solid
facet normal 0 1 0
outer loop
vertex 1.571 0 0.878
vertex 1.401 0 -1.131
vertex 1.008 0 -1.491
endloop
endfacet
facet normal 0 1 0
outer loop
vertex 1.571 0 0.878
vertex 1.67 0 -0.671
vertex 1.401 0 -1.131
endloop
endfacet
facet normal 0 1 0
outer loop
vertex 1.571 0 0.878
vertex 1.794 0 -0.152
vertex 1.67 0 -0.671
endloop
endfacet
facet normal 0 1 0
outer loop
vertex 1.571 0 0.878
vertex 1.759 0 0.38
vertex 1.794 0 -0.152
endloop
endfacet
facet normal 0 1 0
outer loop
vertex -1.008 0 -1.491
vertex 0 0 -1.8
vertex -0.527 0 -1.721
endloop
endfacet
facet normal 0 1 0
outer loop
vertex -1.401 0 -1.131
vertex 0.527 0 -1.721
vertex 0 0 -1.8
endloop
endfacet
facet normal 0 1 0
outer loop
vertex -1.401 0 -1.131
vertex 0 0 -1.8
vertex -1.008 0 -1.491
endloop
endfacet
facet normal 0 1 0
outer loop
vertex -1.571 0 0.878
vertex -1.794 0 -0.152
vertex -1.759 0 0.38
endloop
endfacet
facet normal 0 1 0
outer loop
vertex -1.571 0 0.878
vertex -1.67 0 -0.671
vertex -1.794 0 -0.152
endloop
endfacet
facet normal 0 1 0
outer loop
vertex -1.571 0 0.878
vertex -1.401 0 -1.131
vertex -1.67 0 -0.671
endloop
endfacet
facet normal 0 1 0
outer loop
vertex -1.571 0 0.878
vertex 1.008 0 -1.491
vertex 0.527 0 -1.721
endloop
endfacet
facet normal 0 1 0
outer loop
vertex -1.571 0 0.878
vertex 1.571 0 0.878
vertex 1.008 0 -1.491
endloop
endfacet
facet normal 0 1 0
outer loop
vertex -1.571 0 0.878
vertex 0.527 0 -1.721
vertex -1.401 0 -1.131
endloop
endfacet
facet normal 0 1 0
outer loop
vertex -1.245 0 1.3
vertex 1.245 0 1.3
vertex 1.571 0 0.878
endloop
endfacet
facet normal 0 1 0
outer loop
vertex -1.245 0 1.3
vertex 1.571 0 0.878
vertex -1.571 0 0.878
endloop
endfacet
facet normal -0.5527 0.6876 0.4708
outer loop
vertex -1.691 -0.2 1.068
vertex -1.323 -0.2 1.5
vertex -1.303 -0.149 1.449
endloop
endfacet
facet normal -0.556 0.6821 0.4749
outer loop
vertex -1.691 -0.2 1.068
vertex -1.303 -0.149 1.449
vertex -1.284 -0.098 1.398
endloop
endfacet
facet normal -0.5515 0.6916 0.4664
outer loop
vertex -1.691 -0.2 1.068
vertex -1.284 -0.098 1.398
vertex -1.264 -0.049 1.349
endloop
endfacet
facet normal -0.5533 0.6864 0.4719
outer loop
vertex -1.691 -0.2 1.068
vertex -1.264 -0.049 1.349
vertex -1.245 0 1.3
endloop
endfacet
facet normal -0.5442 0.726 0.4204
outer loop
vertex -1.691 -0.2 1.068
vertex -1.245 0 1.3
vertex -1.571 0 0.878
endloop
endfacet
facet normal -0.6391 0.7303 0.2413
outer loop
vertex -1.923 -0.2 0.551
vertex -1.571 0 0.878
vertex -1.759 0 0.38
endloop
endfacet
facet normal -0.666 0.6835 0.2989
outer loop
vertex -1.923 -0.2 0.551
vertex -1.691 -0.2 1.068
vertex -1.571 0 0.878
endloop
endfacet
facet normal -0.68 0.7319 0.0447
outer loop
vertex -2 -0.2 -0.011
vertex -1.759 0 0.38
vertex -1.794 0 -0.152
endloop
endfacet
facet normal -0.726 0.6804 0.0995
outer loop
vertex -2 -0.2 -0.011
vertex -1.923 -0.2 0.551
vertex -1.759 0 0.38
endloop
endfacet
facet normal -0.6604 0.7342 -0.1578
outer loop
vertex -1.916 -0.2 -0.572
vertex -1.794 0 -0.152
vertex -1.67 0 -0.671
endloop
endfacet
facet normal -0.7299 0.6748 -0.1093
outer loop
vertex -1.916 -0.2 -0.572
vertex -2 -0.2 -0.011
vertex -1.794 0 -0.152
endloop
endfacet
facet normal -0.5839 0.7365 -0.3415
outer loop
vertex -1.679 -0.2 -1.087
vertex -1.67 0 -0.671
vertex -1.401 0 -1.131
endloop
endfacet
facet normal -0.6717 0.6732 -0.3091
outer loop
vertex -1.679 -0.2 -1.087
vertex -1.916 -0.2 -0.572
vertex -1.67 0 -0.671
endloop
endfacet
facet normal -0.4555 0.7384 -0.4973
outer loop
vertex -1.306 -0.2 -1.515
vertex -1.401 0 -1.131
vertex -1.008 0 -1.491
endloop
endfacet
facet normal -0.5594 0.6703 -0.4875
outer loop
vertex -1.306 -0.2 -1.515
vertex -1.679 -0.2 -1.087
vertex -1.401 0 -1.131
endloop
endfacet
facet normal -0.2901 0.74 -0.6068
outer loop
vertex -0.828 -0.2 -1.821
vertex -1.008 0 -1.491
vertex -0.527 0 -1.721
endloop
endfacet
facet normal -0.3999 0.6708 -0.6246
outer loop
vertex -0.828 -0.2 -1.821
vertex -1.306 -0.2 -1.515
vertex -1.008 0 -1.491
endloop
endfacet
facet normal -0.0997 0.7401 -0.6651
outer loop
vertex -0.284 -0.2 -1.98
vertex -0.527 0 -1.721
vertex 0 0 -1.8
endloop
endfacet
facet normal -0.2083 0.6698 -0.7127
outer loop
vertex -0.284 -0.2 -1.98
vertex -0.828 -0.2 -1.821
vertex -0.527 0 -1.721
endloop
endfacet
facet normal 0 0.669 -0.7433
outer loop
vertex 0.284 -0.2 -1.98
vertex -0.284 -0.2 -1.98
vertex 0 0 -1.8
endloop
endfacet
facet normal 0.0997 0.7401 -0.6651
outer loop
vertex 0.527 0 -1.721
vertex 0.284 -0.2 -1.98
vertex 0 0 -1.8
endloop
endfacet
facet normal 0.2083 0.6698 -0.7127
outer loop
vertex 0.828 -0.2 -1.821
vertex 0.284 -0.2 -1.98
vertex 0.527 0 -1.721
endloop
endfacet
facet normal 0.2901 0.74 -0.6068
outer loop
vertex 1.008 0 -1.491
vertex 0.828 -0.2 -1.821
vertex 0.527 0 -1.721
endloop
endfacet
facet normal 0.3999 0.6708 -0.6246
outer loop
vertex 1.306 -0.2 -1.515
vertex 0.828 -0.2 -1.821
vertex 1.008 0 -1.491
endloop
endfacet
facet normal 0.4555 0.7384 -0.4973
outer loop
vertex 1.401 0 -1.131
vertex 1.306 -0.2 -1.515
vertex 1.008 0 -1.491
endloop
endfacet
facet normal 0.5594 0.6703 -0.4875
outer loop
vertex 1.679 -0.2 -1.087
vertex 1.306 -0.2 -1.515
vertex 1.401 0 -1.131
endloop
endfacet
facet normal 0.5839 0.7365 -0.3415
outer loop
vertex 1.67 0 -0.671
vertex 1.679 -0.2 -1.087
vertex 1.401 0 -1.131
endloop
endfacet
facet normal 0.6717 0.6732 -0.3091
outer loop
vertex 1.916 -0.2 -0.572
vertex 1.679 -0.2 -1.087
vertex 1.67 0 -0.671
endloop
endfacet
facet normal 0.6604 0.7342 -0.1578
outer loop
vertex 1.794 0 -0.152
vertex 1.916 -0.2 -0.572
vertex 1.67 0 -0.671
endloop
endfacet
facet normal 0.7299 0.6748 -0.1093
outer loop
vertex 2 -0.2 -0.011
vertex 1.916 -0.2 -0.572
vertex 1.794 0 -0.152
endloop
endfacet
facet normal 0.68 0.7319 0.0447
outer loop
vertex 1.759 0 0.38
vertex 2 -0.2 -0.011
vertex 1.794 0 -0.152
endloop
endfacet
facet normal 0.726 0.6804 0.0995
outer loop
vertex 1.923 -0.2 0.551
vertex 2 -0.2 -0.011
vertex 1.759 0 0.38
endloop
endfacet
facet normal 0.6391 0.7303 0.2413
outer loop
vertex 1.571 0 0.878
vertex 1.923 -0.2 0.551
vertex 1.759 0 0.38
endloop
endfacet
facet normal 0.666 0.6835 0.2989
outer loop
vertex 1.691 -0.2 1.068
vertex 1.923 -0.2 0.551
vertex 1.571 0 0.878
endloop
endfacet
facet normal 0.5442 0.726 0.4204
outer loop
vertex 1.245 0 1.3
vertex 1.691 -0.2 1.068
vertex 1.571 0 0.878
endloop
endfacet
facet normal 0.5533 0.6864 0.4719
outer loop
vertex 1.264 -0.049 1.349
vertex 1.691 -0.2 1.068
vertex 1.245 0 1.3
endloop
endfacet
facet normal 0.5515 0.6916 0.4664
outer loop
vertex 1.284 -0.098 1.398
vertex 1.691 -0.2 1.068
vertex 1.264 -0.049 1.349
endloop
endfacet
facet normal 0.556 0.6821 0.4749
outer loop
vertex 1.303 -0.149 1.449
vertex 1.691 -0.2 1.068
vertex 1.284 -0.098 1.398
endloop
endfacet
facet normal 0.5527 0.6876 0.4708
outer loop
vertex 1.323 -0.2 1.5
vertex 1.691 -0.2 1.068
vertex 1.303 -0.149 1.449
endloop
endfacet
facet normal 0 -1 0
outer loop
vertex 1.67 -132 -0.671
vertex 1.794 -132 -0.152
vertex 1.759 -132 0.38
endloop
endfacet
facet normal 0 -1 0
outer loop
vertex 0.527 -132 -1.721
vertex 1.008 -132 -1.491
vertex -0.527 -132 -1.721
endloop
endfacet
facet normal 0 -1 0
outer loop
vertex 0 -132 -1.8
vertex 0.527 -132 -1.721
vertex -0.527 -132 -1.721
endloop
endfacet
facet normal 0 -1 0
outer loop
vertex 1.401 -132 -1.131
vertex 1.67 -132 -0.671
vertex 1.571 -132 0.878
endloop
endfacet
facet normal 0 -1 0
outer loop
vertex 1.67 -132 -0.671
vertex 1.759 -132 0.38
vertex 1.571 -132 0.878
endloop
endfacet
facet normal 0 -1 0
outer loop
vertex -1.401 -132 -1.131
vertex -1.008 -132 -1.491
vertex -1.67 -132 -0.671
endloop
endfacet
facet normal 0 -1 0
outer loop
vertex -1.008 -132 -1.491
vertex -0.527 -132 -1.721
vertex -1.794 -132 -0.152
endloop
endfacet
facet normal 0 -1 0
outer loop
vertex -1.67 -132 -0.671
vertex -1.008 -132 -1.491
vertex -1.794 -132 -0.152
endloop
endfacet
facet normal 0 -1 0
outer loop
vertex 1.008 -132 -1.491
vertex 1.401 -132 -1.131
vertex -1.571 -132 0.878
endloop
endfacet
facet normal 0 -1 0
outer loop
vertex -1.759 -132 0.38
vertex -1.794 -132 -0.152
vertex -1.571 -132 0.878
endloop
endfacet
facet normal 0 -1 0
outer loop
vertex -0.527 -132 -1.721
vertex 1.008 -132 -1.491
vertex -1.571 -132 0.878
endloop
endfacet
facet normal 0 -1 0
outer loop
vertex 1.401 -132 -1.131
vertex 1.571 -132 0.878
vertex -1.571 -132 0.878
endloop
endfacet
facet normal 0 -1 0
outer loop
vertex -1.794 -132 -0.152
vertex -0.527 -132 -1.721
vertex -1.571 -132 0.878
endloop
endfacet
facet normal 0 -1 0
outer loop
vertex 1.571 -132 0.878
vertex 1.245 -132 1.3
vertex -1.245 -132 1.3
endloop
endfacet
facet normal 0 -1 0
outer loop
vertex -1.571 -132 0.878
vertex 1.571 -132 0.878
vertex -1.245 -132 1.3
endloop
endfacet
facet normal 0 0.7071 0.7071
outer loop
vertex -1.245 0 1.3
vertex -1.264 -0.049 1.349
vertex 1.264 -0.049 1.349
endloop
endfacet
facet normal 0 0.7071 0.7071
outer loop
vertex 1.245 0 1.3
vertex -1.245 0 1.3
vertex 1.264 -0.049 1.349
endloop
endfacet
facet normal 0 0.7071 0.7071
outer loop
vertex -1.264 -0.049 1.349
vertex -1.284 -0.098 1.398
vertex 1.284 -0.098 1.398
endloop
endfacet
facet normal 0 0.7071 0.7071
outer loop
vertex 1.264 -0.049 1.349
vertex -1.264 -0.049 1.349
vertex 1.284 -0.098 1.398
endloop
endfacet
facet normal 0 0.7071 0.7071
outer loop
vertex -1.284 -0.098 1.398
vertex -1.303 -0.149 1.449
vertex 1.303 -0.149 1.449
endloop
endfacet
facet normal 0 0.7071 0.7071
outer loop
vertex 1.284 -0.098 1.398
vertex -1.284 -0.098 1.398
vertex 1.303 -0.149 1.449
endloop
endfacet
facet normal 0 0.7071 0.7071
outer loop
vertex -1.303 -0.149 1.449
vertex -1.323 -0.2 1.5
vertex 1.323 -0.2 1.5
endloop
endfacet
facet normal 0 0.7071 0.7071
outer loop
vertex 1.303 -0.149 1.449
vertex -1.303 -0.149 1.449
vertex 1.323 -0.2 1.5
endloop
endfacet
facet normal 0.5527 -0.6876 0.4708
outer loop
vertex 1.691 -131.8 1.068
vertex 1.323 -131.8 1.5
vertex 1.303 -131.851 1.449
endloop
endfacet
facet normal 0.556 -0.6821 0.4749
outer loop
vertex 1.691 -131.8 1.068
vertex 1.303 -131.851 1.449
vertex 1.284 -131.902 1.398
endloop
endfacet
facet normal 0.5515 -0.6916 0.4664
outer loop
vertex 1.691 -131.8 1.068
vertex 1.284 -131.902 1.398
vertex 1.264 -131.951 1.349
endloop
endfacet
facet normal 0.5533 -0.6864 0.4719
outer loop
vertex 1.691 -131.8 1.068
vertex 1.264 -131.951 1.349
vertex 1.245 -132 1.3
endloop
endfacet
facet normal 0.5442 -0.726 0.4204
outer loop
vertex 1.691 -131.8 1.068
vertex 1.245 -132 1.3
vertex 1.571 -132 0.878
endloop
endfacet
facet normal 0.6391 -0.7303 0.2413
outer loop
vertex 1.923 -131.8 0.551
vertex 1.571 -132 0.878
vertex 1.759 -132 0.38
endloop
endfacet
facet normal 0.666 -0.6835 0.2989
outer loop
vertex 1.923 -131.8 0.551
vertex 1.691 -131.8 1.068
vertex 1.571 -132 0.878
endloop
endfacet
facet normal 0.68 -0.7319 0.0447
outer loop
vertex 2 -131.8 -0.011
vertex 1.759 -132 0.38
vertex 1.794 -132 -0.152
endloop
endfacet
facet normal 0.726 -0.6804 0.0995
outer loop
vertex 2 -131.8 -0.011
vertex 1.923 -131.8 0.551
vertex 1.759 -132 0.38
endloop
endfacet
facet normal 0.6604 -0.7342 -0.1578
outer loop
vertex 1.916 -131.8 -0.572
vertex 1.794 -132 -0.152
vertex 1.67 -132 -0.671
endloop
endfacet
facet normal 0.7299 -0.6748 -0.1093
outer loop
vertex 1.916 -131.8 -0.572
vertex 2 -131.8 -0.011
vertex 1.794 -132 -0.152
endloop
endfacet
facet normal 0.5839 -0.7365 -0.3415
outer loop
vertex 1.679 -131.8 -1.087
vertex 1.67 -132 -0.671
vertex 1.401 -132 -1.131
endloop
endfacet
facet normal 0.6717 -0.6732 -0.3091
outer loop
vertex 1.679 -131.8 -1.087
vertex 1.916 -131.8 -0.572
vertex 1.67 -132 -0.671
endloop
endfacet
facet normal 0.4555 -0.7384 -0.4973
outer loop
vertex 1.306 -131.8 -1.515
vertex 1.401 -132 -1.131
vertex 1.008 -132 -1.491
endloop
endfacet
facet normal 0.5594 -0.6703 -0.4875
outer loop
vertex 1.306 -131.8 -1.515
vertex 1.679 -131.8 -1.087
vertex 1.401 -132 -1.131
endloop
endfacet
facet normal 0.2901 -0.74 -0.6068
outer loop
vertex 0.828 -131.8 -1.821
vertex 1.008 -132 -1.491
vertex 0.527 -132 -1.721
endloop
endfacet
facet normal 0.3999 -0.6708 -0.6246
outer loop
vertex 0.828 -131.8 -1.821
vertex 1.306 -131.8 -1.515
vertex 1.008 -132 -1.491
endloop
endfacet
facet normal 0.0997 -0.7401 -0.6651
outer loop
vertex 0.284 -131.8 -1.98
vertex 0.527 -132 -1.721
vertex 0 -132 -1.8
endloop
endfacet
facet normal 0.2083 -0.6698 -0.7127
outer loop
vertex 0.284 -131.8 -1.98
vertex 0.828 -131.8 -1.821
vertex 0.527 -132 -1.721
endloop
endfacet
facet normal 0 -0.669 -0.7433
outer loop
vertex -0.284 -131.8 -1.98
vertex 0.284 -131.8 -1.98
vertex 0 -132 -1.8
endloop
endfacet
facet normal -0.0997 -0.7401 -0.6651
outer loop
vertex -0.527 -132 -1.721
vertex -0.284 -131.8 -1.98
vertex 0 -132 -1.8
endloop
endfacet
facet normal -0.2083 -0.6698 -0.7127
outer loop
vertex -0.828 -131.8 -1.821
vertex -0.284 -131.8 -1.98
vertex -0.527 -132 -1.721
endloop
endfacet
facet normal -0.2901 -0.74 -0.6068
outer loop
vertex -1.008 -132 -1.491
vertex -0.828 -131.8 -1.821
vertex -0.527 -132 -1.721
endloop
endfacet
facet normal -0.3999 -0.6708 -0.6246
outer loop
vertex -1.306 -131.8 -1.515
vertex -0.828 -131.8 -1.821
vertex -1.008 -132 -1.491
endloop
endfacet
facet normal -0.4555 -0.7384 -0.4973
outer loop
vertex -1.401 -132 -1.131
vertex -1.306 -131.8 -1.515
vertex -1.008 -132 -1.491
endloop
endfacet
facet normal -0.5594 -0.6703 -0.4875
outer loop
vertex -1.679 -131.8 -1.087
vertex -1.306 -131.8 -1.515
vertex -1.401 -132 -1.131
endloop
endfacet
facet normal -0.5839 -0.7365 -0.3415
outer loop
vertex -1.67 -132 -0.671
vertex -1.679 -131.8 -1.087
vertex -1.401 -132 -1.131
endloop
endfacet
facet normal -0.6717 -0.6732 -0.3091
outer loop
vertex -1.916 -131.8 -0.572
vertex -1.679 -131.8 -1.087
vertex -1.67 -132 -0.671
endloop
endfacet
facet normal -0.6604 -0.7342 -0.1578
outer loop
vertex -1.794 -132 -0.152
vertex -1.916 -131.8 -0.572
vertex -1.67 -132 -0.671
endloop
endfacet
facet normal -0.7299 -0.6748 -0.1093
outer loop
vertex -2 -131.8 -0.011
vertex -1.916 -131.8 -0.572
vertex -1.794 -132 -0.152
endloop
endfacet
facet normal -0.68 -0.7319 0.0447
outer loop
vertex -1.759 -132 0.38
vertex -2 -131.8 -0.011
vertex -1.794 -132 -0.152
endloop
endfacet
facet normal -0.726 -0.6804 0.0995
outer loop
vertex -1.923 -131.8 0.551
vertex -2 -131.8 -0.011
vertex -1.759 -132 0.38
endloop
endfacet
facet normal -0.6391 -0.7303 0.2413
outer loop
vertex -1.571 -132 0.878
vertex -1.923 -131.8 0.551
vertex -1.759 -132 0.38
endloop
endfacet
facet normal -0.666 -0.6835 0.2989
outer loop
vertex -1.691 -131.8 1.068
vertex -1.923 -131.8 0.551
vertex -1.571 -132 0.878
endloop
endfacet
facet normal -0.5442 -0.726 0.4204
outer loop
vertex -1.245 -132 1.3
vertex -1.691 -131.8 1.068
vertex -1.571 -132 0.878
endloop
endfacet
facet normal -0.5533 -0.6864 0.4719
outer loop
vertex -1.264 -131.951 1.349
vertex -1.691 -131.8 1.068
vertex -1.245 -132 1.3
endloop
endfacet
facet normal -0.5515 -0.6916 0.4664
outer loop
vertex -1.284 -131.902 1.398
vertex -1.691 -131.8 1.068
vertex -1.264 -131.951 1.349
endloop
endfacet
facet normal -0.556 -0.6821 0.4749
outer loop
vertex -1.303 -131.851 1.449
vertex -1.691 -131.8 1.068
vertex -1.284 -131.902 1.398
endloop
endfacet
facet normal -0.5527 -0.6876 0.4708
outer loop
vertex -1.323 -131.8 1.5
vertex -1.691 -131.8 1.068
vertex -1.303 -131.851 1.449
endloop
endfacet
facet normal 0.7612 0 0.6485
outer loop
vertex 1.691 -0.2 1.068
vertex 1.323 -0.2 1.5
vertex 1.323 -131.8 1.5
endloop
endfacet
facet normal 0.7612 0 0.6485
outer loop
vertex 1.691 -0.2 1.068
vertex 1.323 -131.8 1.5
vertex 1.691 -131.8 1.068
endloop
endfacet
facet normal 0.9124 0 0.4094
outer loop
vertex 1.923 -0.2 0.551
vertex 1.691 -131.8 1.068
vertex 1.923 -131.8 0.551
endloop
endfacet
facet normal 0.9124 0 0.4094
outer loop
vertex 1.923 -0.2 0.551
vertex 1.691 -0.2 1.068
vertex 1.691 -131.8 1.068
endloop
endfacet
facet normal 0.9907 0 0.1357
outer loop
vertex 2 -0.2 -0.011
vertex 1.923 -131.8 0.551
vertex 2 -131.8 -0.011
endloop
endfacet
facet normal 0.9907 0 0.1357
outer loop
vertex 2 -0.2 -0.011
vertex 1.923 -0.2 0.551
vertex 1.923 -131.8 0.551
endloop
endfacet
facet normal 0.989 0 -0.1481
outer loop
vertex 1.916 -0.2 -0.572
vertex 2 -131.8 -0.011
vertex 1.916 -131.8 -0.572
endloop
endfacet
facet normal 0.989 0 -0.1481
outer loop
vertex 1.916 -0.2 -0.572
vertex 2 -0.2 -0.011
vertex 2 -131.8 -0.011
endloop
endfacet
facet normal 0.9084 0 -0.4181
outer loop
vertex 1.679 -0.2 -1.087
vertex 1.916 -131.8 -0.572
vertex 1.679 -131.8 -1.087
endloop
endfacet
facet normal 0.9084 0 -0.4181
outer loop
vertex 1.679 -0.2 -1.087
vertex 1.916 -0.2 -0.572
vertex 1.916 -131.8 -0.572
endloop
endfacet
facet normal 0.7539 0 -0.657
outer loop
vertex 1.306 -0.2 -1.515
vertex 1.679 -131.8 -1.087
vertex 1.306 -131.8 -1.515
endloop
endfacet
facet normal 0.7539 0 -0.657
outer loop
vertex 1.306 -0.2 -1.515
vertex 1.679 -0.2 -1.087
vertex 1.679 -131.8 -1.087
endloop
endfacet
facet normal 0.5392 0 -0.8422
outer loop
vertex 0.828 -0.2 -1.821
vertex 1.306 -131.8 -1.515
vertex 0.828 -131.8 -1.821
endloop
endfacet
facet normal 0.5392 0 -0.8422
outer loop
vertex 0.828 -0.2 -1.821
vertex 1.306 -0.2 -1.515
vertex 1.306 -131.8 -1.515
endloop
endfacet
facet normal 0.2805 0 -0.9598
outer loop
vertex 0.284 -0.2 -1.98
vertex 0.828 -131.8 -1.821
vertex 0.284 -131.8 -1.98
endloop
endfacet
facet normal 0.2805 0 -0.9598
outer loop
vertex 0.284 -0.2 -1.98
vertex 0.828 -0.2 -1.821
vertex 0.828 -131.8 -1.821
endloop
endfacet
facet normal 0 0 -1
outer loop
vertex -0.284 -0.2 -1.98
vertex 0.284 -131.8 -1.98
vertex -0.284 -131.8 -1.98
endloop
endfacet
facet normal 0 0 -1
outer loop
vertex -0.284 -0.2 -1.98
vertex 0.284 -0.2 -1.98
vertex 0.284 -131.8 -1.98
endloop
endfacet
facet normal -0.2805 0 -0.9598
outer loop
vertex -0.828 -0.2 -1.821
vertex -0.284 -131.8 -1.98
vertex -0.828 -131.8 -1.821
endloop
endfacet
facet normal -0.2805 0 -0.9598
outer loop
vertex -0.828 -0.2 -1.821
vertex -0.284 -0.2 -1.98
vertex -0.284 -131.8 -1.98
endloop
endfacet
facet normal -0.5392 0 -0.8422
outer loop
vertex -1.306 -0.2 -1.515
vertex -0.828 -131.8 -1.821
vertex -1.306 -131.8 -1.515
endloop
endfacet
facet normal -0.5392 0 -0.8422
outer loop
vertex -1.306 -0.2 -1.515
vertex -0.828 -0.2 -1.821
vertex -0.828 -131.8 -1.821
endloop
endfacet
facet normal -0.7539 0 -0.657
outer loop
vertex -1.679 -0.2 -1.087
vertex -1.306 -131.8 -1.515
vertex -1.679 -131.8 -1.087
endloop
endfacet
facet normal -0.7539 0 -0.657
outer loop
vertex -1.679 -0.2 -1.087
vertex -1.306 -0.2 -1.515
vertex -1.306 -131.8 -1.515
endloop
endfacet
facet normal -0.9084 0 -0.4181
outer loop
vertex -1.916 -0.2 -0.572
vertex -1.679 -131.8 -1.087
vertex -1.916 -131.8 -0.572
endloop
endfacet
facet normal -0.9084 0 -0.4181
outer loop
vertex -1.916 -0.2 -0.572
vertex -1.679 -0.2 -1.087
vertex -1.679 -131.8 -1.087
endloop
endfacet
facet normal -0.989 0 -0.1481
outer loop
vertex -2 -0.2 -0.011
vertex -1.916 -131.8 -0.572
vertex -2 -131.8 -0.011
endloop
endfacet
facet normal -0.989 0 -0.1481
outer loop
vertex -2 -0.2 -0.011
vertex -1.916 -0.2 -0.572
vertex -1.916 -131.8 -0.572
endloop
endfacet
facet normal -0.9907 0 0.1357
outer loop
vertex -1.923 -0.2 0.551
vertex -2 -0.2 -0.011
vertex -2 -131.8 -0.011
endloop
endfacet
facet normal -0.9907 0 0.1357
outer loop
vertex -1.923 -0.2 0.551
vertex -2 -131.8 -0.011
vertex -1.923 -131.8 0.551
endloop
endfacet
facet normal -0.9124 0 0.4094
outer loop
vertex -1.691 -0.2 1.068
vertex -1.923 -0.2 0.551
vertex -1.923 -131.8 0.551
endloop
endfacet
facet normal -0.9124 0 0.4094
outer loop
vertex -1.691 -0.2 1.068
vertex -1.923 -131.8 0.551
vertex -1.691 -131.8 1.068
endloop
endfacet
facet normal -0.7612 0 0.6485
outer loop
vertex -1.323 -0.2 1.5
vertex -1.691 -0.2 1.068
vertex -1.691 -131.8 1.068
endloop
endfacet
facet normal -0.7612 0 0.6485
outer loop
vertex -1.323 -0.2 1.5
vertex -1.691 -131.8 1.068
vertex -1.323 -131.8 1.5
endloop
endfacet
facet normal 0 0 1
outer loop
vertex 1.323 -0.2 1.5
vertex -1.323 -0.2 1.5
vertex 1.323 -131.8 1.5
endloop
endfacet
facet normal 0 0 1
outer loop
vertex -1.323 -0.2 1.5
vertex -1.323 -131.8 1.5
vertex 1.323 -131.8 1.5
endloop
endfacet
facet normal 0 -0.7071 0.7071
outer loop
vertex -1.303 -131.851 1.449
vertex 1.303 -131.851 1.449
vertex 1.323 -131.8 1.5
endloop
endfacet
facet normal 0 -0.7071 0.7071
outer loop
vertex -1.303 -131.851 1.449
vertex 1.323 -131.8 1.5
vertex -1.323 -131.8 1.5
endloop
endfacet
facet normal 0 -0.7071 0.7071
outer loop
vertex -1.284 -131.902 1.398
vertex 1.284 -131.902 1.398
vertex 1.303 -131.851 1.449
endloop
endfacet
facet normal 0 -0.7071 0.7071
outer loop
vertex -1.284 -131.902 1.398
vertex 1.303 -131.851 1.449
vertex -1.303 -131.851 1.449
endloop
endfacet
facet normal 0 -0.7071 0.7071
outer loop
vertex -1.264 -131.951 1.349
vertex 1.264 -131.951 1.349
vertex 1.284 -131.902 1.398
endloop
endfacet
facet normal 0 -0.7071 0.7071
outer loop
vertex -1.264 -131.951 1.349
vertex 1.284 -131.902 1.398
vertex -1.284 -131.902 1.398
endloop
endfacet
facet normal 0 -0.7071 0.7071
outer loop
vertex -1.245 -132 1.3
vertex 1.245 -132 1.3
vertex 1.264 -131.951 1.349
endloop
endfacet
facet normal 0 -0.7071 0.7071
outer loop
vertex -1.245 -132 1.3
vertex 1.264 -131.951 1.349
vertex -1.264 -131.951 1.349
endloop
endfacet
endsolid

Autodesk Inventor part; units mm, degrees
ref_plane "YZ Plane" through (0, 0, 0) normal (1, 0, 0) x (0, 1, 0)
ref_plane "XZ Plane" through (0, 0, 0) normal (0, 1, 0) x (-1, 0, 0)
ref_plane "XY Plane" through (0, 0, 0) normal (0, 0, 1) x (1, 0, 0)
sketch "Sketch1" plane through (0, 0, 0) normal (0, 1, 0) x (-1, 0, 0)
  circle A0 centre (0, 0) radius 2
  dimension "d0" = 4
extrude "Extrusion1" add sketch "Sketch1" against normal blind 132
sketch "Sketch2" plane through (0, -132, 0) normal (0, -1, 0) x (1, 0, 0)
  circle A0 centre (0, 0) radius 2 projected
  line L0 (-1.3229, 1.5) -> (1.3229, 1.5)
  circle A1 centre (0, 0) radius 2 projected
  dimension "d3" = 0.5
extrude "Extrusion2" cut sketch "Sketch2" against normal through all contours L0 A0 picked at (-0.3089, 1.5908)
chamfer "Chamfer1" distance 0.2 angle 45 4 edges at (0, -132, -2) (0, -132, 1.5) (0, 0, -2) (0, 0, 1.5)
properties part number "10-0132" material "Aluminum 6061"
